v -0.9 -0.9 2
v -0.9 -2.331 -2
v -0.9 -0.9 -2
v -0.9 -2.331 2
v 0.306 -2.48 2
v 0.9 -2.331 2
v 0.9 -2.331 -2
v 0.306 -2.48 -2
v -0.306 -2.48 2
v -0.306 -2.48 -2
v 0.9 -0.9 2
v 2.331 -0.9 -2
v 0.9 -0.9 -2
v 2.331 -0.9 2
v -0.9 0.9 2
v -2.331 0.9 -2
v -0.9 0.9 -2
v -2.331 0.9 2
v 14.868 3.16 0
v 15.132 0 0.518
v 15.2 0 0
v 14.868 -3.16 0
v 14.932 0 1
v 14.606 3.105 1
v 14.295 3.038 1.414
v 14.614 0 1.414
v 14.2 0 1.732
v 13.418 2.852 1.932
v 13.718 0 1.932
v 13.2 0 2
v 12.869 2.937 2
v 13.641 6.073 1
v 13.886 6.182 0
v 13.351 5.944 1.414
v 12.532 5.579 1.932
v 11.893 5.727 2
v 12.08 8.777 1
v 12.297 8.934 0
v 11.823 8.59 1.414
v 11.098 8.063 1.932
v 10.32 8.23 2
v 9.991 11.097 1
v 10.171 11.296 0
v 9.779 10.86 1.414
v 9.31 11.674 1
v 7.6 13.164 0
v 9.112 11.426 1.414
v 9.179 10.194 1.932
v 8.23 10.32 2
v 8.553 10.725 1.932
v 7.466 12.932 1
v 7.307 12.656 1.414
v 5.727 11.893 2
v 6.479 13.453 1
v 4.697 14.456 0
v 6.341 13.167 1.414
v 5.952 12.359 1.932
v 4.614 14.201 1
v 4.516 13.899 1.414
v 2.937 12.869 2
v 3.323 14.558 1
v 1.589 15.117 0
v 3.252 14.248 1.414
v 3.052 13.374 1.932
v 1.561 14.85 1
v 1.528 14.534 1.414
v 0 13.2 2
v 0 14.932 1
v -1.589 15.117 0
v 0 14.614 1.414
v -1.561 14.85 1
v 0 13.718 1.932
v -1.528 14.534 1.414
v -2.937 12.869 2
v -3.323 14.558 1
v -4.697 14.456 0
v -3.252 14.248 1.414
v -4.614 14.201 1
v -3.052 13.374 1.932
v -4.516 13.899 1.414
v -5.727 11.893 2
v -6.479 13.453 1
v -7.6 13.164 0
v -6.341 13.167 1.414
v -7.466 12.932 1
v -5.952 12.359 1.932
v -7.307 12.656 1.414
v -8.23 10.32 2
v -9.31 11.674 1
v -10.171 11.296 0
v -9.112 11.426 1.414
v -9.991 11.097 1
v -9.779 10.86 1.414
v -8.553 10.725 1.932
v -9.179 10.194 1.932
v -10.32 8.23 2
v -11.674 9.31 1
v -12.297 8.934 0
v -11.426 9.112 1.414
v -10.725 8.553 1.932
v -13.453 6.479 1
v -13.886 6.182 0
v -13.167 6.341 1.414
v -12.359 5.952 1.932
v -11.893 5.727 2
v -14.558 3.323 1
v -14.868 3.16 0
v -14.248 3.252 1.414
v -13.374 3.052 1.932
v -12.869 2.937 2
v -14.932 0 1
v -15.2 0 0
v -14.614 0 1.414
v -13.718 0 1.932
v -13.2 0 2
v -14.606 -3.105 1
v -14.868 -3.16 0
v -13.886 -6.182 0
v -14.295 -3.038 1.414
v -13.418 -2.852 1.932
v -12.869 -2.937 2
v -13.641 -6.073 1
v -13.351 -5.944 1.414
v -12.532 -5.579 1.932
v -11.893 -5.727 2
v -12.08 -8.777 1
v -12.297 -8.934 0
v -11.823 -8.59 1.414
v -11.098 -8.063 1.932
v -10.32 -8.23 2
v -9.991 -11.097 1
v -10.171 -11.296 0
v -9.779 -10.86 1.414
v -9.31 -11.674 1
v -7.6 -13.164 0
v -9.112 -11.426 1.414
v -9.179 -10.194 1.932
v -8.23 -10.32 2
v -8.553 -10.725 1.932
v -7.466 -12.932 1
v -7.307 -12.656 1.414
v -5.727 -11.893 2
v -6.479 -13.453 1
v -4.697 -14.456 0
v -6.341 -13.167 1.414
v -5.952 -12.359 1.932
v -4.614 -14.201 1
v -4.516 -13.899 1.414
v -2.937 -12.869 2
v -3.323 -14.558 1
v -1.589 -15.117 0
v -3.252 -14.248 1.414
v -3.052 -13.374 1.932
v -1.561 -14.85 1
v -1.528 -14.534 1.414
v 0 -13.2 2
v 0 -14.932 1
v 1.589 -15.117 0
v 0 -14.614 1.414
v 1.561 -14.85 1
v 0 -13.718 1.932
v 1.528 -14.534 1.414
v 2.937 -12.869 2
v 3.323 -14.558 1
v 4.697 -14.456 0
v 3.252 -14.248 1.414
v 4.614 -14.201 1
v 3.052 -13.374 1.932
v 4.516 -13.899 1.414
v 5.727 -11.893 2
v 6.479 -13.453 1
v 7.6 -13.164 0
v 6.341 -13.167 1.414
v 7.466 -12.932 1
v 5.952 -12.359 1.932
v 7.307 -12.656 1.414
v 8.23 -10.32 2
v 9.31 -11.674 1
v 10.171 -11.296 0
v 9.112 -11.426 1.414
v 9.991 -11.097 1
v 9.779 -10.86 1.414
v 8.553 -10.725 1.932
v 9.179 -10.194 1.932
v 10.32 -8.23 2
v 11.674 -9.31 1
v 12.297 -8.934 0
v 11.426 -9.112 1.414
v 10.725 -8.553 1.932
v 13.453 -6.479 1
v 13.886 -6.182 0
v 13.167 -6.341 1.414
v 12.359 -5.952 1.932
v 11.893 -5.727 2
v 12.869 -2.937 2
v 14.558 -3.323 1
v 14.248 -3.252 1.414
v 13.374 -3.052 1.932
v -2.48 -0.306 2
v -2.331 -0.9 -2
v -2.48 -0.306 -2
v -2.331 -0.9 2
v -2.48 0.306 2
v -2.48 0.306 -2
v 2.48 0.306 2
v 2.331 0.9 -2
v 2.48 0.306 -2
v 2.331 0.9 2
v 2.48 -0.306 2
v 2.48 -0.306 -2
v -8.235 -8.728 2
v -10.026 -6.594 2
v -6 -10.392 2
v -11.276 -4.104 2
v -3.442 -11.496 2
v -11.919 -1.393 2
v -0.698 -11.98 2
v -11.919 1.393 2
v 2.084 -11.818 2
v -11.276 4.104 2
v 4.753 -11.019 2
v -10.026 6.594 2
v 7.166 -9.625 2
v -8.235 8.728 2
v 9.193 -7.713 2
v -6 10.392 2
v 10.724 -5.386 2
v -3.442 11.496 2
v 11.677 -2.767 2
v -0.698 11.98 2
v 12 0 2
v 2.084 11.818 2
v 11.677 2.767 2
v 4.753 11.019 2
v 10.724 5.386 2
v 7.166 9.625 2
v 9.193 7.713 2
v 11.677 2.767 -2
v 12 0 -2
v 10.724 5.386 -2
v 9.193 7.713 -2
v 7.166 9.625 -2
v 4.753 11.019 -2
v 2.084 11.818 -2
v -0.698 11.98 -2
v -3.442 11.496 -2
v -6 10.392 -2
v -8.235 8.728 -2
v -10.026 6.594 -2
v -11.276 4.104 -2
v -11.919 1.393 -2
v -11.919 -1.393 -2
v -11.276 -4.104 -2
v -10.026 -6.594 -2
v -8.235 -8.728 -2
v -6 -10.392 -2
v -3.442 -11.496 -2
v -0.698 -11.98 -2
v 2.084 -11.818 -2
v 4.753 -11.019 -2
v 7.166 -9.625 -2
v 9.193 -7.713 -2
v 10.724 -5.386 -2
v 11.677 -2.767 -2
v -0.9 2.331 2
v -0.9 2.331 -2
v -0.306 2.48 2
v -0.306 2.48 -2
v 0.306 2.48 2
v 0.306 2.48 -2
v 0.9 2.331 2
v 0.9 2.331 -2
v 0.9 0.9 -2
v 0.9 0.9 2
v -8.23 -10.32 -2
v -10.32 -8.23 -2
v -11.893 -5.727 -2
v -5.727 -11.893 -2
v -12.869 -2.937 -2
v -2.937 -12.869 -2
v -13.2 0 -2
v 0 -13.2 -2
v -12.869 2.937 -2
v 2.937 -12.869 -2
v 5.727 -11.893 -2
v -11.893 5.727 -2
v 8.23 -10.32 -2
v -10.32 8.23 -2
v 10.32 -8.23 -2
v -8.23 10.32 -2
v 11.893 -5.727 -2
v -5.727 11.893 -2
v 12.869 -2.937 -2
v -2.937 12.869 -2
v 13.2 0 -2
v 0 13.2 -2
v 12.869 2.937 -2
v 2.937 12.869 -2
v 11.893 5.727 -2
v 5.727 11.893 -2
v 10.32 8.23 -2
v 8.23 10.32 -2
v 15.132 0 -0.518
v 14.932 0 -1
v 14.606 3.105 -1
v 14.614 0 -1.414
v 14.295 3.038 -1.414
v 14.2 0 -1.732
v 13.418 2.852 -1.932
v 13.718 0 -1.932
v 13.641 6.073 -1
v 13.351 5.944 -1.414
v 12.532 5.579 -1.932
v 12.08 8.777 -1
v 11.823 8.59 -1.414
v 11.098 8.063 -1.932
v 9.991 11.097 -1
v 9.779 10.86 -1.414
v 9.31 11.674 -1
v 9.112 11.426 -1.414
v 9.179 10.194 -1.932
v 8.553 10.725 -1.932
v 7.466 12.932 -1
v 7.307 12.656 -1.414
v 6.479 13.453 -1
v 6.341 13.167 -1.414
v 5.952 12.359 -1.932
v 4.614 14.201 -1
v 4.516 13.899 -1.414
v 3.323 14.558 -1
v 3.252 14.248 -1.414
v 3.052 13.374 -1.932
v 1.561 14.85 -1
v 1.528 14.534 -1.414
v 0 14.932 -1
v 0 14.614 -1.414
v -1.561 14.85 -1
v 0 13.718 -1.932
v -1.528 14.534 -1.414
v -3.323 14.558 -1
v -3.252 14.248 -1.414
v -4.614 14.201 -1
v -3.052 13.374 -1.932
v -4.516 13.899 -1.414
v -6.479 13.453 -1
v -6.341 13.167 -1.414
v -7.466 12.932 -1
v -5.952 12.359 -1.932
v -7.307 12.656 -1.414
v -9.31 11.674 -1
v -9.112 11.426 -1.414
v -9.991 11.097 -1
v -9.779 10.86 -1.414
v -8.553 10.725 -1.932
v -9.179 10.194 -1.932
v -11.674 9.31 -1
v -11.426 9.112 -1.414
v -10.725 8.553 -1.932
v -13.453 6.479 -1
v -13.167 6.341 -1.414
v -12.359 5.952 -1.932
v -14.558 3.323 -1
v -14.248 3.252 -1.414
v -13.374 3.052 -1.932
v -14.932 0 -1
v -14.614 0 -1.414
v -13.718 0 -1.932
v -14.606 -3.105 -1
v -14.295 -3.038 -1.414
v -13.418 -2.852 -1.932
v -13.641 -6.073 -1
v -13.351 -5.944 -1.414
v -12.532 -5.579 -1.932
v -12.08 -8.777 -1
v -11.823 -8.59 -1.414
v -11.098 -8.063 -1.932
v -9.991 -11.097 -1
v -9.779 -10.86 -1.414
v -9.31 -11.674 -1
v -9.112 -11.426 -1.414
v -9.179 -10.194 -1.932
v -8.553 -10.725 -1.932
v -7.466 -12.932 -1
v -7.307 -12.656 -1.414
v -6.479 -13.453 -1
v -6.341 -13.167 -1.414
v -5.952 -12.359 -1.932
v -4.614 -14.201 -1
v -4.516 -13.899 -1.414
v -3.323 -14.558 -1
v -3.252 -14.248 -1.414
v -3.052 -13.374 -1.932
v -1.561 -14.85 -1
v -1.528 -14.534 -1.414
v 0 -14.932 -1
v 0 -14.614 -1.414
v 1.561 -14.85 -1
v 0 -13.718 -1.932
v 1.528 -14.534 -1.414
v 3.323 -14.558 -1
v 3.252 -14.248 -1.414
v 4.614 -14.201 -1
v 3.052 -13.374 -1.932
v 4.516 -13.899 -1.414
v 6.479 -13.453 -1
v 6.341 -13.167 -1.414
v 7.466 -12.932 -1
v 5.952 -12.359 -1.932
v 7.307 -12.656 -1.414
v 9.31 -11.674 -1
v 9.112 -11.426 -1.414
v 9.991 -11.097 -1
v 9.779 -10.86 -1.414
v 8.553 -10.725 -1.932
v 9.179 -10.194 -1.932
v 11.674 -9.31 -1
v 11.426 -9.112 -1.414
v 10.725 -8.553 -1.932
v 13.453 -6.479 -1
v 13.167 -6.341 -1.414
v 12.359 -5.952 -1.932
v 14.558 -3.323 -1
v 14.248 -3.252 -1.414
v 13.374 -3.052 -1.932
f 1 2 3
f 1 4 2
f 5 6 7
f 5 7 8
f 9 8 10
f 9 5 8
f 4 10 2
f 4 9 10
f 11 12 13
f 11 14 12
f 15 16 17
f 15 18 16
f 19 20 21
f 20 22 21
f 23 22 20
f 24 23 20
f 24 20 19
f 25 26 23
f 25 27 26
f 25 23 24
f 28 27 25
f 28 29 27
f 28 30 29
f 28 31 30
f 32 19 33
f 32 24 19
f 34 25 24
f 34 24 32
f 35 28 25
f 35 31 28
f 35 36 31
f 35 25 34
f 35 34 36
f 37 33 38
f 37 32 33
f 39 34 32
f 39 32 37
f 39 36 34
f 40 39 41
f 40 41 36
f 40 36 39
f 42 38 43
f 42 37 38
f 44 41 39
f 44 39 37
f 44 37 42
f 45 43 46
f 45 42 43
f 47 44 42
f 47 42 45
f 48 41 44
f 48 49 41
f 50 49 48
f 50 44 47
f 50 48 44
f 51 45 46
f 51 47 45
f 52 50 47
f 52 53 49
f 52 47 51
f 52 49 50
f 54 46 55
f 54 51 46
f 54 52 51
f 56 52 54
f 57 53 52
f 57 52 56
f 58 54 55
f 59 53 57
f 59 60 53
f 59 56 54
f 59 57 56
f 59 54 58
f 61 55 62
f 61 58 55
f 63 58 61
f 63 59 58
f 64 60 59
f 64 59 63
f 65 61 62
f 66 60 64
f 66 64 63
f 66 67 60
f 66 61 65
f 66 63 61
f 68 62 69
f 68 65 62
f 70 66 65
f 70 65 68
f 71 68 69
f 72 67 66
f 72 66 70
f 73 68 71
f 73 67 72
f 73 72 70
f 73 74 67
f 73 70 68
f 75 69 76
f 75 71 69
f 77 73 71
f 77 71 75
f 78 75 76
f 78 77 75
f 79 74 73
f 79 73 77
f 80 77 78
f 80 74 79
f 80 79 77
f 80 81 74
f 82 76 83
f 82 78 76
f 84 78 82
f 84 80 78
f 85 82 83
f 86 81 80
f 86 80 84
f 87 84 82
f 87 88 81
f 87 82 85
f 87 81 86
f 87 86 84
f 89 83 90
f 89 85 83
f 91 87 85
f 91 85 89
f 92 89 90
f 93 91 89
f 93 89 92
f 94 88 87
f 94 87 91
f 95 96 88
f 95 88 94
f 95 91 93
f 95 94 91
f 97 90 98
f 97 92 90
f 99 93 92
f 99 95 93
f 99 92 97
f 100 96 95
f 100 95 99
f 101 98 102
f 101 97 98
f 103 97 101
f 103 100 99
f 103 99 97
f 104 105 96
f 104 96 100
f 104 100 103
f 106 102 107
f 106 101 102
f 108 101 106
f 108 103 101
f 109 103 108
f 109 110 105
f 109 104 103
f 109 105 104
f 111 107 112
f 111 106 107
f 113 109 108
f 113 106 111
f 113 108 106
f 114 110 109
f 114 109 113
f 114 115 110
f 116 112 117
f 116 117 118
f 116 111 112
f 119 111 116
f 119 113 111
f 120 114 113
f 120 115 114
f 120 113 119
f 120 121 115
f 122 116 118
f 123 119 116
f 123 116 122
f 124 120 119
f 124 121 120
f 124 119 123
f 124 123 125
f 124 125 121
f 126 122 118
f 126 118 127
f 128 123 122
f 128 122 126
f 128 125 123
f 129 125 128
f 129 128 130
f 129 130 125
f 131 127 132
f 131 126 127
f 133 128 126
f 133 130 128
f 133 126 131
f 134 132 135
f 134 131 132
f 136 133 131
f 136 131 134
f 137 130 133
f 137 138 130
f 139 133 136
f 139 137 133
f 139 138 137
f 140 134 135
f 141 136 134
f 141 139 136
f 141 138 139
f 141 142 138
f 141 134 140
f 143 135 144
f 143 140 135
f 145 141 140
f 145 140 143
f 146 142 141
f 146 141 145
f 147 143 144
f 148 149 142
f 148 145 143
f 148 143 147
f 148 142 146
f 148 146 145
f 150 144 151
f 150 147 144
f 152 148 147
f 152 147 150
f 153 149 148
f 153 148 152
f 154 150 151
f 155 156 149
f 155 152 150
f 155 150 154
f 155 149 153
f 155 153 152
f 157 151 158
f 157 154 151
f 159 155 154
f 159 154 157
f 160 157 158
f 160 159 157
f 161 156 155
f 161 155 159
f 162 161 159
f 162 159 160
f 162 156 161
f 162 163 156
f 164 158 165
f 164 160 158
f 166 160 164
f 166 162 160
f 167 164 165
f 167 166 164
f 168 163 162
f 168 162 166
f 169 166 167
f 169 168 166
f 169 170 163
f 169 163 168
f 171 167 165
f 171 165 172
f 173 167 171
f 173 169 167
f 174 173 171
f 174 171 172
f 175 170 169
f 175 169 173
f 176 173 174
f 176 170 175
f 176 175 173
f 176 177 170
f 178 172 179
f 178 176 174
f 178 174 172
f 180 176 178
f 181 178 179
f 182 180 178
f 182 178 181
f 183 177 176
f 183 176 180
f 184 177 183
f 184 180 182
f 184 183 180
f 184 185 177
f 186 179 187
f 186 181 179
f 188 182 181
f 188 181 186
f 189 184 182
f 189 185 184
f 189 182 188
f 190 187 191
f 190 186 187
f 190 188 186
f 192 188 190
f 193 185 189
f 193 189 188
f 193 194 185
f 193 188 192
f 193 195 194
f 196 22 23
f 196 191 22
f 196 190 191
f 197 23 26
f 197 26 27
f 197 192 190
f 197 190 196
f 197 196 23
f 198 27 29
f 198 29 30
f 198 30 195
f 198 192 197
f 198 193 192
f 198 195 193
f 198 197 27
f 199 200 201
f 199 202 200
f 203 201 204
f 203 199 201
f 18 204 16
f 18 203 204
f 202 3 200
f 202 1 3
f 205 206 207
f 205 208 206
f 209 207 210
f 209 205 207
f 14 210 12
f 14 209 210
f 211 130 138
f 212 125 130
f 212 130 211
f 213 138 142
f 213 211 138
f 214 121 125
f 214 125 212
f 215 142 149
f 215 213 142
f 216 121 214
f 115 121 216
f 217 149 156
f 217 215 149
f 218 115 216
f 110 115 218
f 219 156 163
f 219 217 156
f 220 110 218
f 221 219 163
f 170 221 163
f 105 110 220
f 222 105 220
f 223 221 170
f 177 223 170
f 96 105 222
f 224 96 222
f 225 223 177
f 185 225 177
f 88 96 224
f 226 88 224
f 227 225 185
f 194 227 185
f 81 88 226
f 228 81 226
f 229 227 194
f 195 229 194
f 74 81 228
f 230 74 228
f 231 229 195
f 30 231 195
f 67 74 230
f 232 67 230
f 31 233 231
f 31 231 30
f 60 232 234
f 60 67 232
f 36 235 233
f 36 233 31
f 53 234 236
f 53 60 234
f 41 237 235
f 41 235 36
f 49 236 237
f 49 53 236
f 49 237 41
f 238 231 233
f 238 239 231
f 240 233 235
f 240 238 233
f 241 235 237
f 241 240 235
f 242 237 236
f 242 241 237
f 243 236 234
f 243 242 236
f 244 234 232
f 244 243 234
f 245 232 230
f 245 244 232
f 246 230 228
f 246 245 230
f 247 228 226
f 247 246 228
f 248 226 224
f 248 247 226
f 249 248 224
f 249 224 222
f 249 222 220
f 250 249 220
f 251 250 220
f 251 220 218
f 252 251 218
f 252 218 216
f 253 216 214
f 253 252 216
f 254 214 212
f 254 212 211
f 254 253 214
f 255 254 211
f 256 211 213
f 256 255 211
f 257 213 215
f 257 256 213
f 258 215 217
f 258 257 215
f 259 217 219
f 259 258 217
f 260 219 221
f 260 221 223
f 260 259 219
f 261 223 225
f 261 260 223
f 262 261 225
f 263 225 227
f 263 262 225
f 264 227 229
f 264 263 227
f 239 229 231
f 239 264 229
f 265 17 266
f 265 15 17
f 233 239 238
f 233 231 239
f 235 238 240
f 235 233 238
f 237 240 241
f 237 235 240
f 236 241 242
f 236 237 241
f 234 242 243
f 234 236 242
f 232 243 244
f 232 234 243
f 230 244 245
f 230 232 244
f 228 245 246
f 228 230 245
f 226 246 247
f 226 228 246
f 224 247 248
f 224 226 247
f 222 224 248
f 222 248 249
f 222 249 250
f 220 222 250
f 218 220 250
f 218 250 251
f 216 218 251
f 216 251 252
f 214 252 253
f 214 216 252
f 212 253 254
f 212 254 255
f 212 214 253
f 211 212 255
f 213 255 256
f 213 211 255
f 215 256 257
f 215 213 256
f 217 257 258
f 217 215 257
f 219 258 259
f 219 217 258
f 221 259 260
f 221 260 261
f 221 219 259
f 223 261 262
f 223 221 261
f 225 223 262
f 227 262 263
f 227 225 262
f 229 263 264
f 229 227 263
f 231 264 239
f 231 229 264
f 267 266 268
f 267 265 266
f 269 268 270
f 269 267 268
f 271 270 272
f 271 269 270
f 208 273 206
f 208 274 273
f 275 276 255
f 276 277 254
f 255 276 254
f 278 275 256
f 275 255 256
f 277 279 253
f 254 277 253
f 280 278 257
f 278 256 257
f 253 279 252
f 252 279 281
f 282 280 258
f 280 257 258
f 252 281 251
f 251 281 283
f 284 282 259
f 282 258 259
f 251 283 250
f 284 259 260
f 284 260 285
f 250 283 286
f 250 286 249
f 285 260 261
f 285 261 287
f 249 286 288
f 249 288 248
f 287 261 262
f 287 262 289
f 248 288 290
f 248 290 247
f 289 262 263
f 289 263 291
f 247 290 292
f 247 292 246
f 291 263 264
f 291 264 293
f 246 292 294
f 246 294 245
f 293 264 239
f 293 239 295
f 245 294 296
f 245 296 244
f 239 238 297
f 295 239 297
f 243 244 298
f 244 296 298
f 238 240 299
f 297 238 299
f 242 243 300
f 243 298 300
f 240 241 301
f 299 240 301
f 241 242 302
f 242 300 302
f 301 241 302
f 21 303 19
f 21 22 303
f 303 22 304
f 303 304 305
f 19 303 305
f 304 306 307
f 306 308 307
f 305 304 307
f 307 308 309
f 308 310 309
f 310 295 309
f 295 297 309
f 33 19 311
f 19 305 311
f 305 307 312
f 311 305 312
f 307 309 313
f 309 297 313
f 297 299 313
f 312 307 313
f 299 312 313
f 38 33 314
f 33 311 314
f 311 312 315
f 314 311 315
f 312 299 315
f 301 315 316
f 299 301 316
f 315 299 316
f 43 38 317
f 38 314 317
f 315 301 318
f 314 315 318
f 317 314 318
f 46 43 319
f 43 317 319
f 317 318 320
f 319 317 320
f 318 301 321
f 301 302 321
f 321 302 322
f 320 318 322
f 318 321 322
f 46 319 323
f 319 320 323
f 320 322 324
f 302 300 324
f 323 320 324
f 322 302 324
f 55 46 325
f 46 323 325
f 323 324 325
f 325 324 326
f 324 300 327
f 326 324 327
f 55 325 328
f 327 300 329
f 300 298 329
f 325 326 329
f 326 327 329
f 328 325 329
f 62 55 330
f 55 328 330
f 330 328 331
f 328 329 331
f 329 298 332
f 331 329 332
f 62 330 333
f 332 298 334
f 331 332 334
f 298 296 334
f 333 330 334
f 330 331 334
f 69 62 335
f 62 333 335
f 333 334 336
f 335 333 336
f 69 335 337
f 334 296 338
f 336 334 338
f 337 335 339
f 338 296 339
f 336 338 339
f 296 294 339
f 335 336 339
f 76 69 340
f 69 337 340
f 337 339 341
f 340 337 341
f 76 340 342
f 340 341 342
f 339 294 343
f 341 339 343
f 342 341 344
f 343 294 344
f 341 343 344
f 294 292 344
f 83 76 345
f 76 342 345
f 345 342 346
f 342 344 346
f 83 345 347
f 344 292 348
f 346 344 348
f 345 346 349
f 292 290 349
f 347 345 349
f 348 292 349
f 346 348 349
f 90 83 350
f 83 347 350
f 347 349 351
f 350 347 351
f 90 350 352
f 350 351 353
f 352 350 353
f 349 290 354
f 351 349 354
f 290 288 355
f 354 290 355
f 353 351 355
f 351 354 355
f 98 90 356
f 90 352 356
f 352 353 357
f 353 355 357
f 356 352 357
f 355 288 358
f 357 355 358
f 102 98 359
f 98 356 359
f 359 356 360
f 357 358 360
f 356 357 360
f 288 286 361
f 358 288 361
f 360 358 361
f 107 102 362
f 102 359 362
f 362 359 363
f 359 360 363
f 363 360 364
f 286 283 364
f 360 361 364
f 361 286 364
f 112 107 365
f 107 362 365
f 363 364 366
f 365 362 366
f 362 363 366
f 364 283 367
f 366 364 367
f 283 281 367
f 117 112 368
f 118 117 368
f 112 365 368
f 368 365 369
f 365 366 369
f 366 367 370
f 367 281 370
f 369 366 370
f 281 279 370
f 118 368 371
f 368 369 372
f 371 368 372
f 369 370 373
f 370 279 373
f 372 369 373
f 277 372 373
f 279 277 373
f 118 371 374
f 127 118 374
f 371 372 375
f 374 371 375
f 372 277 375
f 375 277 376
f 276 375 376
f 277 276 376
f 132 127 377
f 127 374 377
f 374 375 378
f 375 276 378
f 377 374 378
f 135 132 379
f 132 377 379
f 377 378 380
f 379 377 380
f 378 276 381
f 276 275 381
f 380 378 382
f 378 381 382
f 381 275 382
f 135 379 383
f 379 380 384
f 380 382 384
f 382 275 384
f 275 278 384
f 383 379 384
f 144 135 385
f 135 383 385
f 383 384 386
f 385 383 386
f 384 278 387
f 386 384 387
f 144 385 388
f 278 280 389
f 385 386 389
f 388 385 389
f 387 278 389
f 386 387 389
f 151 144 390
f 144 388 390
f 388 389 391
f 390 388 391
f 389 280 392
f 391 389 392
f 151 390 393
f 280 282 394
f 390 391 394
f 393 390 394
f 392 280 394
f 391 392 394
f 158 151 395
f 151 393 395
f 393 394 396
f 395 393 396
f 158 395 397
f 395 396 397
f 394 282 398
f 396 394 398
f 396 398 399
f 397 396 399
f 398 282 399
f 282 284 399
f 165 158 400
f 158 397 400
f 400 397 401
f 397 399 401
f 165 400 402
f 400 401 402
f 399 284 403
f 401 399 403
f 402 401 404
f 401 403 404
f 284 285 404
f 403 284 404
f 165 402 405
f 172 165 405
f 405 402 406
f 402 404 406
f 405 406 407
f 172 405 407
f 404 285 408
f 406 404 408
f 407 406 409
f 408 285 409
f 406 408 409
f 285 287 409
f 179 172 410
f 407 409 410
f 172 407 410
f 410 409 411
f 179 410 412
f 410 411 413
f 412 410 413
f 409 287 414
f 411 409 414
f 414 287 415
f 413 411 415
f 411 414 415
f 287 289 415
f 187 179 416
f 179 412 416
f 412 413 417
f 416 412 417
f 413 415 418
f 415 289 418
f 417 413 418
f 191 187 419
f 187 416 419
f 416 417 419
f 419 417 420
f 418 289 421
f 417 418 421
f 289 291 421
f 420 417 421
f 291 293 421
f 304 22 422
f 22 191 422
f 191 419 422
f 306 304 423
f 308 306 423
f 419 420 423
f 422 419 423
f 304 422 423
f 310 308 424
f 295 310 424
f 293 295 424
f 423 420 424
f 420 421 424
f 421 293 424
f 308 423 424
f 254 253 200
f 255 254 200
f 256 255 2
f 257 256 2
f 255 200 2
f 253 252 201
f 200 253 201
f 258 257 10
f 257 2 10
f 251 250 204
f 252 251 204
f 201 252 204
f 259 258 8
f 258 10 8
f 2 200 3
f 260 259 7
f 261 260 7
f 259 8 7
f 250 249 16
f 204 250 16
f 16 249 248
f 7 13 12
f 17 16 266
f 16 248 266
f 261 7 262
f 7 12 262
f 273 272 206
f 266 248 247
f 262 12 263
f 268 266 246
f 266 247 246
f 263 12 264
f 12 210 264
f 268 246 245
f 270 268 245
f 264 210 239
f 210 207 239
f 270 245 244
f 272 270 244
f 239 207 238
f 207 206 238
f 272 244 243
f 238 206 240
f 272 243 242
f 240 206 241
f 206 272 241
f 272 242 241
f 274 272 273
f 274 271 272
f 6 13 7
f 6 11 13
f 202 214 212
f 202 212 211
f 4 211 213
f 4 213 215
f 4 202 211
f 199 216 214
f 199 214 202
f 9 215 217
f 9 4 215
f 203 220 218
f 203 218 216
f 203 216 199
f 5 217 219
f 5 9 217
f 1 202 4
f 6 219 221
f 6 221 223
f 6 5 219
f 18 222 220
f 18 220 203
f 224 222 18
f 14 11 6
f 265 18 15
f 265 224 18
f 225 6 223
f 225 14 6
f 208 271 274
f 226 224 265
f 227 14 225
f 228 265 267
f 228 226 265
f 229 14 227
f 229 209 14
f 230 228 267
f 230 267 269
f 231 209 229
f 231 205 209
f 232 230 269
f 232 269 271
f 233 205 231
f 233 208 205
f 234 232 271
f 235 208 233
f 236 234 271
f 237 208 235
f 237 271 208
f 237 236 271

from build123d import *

# Parameters (mm, degrees)
F0_R     = 12
F1_DEPTH = 2
F0_R_2   = 15.2
F2_DEPTH = 2
F3_R     = 1.99999


# Not quite as in the source:
# - a fillet or chamfer is up to 0.001 mm smaller than in the source, because OpenCascade refuses the exact size


with BuildPart() as f1:
    # F0 (on Top) → F1 (new body, symmetric)
    with BuildSketch(Plane.XY):
        Circle(F0_R)
        with BuildLine():
            ThreePointArc((0.9, -2.3313088598), (0, -2.499), (-0.9, -2.3313088598))
            Line((-0.9, -2.3313088598), (-0.9, -0.9))
            Line((-0.9, -0.9), (-2.3313088598, -0.9))
            ThreePointArc((-2.3313088598, -0.9), (-2.499, 0), (-2.3313088598, 0.9))
            Line((-2.3313088598, 0.9), (-0.9, 0.9))
            Line((-0.9, 0.9), (-0.9, 2.3313088598))
            ThreePointArc((-0.9, 2.3313088598), (0, 2.499), (0.9, 2.3313088598))
            Line((0.9, 2.3313088598), (0.9, 0.9))
            Line((0.9, 0.9), (2.3313088598, 0.9))
            ThreePointArc((2.3313088598, 0.9), (2.499, 0), (2.3313088598, -0.9))
            Line((2.3313088598, -0.9), (0.9, -0.9))
            Line((0.9, -0.9), (0.9, -2.3313088598))
        make_face(mode=Mode.SUBTRACT)
    extrude(amount=F1_DEPTH, both=True)


with BuildPart() as f2:
    # F0 (on Top) → F2 (new body, symmetric)
    with BuildSketch(Plane.XY):
        Circle(F0_R_2)
        Circle(F0_R, mode=Mode.SUBTRACT)
    extrude(amount=F2_DEPTH, both=True)

    # F3 (radius 2 in the source; OpenCascade refuses exactly that, so slightly less here)
    f3_edges = [f2.edges().sort_by_distance(p)[0] for p in [
        (-15.2, 0, 2),
        (-15.2, 0, -2),
    ]]
    fillet(f3_edges, radius=F3_R)


solid = Compound([f1.part, f2.part])
